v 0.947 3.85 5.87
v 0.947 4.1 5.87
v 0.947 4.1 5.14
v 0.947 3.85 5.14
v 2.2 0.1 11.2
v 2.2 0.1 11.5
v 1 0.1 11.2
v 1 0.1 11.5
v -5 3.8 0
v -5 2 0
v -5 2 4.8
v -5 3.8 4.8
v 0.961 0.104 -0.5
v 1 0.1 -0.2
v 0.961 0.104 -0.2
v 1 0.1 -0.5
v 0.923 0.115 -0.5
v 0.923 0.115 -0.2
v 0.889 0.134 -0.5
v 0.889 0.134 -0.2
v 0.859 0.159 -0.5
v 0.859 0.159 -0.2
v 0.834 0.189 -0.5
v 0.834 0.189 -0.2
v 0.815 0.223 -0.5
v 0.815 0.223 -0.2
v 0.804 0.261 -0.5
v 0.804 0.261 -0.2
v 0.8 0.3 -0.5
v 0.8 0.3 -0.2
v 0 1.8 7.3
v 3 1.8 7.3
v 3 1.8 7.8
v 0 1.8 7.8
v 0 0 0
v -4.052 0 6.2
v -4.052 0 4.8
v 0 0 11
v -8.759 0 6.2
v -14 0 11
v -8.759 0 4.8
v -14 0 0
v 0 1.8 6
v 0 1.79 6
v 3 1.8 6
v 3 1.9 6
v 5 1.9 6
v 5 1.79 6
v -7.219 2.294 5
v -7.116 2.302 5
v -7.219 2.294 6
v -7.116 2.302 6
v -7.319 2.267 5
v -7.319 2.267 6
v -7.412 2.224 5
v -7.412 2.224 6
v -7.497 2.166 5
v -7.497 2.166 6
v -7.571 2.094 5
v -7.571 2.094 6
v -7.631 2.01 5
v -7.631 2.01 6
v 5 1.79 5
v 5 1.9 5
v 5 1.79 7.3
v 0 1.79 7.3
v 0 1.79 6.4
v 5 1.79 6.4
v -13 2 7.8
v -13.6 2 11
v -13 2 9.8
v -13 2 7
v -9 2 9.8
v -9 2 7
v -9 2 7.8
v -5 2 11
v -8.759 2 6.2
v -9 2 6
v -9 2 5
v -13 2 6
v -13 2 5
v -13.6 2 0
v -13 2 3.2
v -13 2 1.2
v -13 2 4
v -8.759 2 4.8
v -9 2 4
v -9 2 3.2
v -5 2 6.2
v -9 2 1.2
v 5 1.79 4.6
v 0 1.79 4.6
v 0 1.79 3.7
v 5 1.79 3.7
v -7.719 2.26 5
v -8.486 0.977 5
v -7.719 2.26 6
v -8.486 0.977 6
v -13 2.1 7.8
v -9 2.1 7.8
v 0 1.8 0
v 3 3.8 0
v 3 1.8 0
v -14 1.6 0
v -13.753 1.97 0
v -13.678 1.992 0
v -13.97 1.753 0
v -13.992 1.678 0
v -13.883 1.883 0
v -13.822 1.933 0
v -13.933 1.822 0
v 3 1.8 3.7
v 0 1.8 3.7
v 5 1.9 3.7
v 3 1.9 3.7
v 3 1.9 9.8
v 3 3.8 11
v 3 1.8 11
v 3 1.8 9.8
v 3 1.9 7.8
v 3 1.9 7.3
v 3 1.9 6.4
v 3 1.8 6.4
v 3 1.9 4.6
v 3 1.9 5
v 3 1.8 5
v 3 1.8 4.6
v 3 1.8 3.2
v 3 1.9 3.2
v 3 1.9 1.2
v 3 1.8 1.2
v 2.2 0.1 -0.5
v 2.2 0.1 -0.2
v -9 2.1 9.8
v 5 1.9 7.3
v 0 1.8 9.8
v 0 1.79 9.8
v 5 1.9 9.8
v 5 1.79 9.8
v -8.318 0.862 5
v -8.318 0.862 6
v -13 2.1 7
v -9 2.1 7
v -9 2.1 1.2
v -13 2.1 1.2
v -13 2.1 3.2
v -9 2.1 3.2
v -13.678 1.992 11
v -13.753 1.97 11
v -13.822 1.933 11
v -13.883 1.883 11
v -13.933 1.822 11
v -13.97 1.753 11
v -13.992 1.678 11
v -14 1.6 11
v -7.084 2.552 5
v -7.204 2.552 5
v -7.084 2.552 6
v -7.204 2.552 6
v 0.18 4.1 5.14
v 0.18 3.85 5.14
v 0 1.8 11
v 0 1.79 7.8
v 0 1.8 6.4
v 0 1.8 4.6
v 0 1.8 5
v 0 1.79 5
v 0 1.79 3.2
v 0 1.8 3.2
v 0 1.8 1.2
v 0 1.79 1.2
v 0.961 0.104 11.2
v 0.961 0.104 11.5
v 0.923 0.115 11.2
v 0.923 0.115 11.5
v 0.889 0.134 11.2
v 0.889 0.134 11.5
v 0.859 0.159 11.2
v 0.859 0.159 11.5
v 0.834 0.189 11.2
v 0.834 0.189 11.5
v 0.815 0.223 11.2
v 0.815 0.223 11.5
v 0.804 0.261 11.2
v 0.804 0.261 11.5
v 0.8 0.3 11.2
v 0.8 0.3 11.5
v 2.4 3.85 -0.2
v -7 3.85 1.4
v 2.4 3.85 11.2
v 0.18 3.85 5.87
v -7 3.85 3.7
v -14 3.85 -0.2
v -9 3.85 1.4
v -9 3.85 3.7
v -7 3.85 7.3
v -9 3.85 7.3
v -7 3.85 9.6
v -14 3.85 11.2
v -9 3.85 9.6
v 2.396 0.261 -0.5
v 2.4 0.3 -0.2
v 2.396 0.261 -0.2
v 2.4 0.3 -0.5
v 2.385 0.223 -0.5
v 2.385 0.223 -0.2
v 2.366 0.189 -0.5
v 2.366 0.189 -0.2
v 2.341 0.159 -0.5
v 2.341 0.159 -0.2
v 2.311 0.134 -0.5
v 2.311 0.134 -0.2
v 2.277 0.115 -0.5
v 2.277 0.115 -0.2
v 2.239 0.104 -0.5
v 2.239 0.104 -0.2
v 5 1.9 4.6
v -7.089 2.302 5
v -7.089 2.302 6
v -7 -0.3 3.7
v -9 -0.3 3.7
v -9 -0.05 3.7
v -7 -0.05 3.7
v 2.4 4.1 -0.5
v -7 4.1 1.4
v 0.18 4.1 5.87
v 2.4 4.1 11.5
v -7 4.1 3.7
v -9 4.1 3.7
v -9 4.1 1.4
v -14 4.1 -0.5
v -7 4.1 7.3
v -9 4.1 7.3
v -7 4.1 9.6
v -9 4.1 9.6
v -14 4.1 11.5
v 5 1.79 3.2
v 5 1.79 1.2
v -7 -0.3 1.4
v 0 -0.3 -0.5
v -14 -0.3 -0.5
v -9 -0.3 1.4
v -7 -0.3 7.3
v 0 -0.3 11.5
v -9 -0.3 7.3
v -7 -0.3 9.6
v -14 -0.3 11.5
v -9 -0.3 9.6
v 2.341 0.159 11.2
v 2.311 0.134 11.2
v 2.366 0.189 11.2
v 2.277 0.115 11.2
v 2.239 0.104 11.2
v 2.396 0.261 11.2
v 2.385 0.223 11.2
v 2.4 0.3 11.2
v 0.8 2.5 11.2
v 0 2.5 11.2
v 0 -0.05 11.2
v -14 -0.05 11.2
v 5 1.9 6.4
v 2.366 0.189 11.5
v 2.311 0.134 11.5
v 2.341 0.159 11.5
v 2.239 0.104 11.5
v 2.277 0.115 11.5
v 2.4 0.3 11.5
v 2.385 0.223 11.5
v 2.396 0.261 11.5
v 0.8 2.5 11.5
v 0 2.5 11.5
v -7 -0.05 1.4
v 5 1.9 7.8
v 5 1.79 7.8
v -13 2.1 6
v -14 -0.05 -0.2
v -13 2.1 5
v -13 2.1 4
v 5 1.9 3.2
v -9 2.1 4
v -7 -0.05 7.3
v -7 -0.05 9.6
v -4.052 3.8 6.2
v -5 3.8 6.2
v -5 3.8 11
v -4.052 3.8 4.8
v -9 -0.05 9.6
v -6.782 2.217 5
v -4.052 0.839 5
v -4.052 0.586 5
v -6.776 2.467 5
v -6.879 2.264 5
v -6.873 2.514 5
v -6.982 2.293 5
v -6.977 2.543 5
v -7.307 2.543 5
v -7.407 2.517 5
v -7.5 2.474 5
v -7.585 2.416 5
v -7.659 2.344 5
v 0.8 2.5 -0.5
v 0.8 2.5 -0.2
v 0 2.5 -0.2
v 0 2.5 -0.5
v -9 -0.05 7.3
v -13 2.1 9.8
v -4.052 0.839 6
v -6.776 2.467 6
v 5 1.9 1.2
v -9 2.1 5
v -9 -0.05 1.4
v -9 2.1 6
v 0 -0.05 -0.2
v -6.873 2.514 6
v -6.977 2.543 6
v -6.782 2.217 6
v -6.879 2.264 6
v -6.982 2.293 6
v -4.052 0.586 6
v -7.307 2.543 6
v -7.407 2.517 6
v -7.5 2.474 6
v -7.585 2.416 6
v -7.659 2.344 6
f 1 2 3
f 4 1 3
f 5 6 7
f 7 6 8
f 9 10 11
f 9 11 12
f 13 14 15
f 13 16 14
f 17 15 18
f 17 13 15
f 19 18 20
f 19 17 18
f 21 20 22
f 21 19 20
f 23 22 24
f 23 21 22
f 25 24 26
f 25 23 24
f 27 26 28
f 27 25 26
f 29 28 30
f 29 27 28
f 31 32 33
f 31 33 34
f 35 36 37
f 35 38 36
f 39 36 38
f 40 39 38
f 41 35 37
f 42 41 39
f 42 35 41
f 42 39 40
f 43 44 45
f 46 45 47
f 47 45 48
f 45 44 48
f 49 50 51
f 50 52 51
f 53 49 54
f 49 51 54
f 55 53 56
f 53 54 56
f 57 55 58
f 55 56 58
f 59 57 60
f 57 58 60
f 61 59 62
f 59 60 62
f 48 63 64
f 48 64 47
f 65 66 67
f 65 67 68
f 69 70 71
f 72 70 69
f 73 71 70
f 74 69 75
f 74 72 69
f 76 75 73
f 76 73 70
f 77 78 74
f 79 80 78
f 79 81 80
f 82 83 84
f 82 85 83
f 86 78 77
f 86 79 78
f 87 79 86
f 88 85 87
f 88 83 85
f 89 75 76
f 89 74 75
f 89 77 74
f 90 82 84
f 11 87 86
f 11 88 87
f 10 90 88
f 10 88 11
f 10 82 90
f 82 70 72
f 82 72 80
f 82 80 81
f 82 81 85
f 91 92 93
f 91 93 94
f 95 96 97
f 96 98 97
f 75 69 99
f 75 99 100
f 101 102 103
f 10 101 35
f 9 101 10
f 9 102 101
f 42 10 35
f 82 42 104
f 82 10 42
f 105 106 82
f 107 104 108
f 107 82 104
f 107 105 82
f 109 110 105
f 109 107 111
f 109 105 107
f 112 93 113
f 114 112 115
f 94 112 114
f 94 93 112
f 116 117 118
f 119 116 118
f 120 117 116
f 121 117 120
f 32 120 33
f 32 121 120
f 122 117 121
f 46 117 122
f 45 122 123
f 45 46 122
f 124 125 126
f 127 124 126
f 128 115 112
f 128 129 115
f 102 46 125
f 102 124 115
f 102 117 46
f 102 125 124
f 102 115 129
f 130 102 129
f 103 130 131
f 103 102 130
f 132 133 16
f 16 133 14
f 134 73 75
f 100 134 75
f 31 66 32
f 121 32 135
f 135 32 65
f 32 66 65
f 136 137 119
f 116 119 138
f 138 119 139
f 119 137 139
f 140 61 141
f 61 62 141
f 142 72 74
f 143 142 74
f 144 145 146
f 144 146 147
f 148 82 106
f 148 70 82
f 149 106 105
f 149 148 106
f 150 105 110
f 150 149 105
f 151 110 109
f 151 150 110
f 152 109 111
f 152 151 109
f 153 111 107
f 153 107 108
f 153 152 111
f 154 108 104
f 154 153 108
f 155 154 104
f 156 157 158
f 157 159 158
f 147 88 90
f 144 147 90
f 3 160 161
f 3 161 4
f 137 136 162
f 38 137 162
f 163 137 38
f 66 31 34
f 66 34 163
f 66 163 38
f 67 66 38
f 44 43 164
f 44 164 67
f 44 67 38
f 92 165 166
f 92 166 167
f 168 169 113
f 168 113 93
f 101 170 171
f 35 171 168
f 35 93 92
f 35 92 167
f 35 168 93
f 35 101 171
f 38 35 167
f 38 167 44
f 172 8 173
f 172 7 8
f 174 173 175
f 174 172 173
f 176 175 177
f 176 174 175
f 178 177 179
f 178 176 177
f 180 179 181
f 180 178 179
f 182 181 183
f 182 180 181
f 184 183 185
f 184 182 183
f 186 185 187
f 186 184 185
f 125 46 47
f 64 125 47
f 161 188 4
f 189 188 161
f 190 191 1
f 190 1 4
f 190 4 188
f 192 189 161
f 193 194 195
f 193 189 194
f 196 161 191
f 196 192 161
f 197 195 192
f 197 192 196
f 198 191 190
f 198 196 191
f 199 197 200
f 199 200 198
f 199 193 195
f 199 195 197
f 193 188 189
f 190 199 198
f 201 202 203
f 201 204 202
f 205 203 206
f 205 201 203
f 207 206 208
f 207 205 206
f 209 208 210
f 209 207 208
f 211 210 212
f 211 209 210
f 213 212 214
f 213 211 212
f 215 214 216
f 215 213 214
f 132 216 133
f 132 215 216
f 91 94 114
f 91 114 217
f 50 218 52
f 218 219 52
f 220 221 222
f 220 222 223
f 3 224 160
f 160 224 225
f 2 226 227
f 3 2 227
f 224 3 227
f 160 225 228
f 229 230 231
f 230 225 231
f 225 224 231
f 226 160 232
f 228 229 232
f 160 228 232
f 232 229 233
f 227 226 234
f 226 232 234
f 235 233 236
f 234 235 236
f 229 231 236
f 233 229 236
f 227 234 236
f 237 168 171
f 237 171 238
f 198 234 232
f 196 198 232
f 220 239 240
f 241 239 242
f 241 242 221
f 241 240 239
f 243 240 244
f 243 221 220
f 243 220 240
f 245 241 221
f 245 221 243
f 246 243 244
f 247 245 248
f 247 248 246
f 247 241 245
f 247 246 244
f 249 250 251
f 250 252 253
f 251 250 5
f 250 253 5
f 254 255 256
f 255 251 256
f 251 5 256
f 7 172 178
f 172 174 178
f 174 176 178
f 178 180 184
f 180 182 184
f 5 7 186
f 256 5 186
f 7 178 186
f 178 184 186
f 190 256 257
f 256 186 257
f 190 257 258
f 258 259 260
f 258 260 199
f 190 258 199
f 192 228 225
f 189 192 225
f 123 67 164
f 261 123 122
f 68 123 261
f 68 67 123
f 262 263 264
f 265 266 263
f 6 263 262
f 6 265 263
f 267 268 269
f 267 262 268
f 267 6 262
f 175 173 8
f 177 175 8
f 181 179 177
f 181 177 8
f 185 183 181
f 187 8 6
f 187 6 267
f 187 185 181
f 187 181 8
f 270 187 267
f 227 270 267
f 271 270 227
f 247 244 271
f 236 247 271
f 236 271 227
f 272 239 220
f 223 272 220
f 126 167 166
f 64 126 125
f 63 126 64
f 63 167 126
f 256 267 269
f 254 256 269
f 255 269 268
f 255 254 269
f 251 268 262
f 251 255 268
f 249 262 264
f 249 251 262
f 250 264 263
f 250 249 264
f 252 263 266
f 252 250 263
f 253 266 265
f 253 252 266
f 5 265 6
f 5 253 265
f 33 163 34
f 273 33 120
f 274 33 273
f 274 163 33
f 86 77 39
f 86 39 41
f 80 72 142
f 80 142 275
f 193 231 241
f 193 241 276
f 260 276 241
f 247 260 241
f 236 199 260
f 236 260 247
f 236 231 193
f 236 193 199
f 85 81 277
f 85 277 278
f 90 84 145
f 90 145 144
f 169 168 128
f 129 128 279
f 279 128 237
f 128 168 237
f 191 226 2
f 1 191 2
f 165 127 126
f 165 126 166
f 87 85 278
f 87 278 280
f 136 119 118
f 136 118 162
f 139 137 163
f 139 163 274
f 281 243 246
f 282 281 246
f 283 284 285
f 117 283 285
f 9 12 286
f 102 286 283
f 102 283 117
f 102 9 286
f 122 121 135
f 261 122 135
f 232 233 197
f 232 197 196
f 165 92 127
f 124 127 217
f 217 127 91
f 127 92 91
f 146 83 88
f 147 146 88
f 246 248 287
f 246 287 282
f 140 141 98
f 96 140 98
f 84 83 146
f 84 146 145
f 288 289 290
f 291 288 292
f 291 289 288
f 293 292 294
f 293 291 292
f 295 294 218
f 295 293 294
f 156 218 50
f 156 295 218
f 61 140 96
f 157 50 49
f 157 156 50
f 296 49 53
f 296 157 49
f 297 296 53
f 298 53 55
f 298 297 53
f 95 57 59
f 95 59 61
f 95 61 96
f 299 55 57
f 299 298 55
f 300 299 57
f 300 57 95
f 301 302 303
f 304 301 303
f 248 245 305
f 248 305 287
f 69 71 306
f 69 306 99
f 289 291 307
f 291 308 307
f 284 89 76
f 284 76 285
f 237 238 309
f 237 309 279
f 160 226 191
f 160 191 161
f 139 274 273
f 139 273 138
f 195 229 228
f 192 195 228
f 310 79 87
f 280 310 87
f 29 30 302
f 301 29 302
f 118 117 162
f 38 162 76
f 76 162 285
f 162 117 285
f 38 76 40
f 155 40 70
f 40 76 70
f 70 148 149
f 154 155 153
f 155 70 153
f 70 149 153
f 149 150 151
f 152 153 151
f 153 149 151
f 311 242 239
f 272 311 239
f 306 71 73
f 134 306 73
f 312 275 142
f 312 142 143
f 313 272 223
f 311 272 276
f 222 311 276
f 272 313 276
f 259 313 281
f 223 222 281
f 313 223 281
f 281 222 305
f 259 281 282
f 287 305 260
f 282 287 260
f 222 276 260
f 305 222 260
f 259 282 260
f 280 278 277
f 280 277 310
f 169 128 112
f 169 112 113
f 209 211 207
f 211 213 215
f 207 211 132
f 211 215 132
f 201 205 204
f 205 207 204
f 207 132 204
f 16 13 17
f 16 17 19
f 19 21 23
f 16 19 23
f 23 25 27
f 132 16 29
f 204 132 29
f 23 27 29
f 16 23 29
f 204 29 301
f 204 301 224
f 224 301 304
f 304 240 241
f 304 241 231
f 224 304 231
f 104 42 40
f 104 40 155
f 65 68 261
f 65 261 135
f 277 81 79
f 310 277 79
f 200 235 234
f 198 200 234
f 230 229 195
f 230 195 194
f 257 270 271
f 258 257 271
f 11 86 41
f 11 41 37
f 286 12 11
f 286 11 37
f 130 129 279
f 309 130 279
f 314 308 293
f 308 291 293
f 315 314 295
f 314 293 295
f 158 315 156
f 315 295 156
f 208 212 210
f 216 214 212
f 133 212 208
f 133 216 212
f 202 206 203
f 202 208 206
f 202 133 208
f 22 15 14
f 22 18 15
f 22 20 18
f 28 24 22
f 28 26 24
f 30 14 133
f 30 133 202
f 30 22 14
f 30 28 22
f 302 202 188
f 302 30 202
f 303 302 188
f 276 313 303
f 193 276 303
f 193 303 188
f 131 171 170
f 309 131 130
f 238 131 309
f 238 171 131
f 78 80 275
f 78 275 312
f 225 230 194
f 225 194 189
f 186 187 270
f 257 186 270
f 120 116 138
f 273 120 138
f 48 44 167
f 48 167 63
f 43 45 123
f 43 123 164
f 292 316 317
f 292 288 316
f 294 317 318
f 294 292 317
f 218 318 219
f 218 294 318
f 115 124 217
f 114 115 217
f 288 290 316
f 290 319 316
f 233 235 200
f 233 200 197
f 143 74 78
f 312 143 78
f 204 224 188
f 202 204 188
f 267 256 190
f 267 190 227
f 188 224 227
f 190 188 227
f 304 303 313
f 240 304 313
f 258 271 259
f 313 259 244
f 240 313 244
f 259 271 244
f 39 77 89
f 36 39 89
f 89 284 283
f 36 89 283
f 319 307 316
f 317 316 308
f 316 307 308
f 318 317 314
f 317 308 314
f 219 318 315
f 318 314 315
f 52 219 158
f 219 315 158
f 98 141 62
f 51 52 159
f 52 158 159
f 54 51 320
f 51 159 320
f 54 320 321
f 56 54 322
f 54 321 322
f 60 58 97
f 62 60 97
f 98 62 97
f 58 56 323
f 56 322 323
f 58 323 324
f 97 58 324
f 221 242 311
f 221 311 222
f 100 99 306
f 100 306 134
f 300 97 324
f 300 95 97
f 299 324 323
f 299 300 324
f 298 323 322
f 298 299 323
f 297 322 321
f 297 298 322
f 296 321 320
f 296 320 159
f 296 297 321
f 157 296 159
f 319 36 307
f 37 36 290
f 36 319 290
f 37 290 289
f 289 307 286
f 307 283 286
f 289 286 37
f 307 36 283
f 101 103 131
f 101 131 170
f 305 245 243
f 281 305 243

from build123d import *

# Parameters (mm, degrees)
EXTRUDE_1_DEPTH          = 11
SKETCH_3_W               = 4
SKETCH_3_H               = 1
SKETCH_3_H_2             = 2
EXTRUDE_2_DEPTH          = 0.1
SKETCH_5_W               = 4.70699789
SKETCH_5_H               = 1.4
CUT_EXTRUDE_2_DEPTH      = 2.8
CUT_EXTRUDE_2_DEPTH_BACK = 3
EXTRUDE_3_DEPTH          = 0.5
FILLET_1_R               = 0.6
SKETCH_6_W               = 5
SKETCH_6_H               = 0.9
SKETCH_6_H_2             = 2
SKETCH_6_H_3             = 1
EXTRUDE_4_DEPTH          = 0.01
EXTRUDE_4_DEPTH_BACK     = 0.1
FILLET_2_R               = 0.4
SKETCH_8_W               = 12
SKETCH_8_H               = 4.4
SKETCH_8_W_2             = 11.4
SKETCH_8_H_2             = 3.9
EXTRUDE_5_DEPTH          = 16.4
SKETCH_9_W               = 2
SKETCH_9_H               = 2.3
SKETCH_9_W_2             = 0.767462698
SKETCH_9_H_2             = 0.729858924
CUT_EXTRUDE_5_DEPTH      = 0.25
SKETCH_12_W              = 2
SKETCH_12_H              = 2.3
CUT_EXTRUDE_6_DEPTH      = 0.25
CUT_EXTRUDE_7_DEPTH      = 1
CUT_EXTRUDE_7_DEPTH_BACK = 13
FILLET_4_R               = 0.2


with BuildPart() as part:
    # 草图2 → 凸台-拉伸1 (new body)
    with BuildSketch(Plane.XY):
        Polygon((0, 0), (-14, 0), (-14, 2), (-5, 2), (-5, 3.8), (3, 3.8), (3, 1.8), (0, 1.8), align=None)
    extrude(amount=EXTRUDE_1_DEPTH)

    # 草图3 → 凸台-拉伸2 (add)
    with BuildSketch(Plane(origin=(0, 2, 0), x_dir=(1, 0, 0), z_dir=(0, 1, 0))):
        with Locations((-11, -6.5)):
            Rectangle(SKETCH_3_W, SKETCH_3_H)
        with Locations((-11, -8.8)):
            Rectangle(SKETCH_3_W, SKETCH_3_H_2)
        with Locations((-11, -4.5)):
            Rectangle(SKETCH_3_W, SKETCH_3_H)
        with Locations((-11, -2.2)):
            Rectangle(SKETCH_3_W, SKETCH_3_H_2)
    extrude(amount=EXTRUDE_2_DEPTH)

    # 草图5 → 切除-拉伸2 (cut, two sides)
    with BuildSketch(Plane(origin=(0, 2, 0), x_dir=(1, 0, 0), z_dir=(0, 1, 0))) as cut_extrude_2_sk:
        with Locations((-6.40593933, -5.5)):
            Rectangle(SKETCH_5_W, SKETCH_5_H)
    extrude(amount=CUT_EXTRUDE_2_DEPTH, mode=Mode.SUBTRACT)
    extrude(cut_extrude_2_sk.sketch, amount=-CUT_EXTRUDE_2_DEPTH_BACK, mode=Mode.SUBTRACT)

    # 草图4 → 凸台-拉伸3 (add, symmetric)
    with BuildSketch(Plane.XY.offset(5.5)):
        Polygon((-8.486379068, 0.97747076), (-7.544801814, 2.552308695), (-6.918443353, 2.552308695), (-4.052440385, 0.838758912), (-4.052440385, 0.585620875), (-6.92380134, 2.302374137), (-7.456665732, 2.302374137), (-8.317726091, 0.862204981), align=None)
    extrude(amount=EXTRUDE_3_DEPTH, both=True)

    # 圆角1
    fillet_1_edges = [part.edges().sort_by_distance(p)[0] for p in [
        (-6.918443353, 2.552308695, 5.5),
        (-7.544801814, 2.552308695, 5.5),
        (-7.456665732, 2.302374137, 5.5),
        (-6.92380134, 2.302374137, 5.5),
    ]]
    fillet(fillet_1_edges, radius=FILLET_1_R)

    # 草图6 → 凸台-拉伸4 (add, two sides)
    with BuildSketch(Plane.XZ.offset(-1.8)) as extrude_4_sk:
        with Locations((2.5, 4.15)):
            Rectangle(SKETCH_6_W, SKETCH_6_H)
        with Locations((2.5, 8.8)):
            Rectangle(SKETCH_6_W, SKETCH_6_H_2)
        with Locations((2.5, 6.85)):
            Rectangle(SKETCH_6_W, SKETCH_6_H)
        with Locations((2.5, 2.2)):
            Rectangle(SKETCH_6_W, SKETCH_6_H_2)
        with Locations((2.5, 5.5)):
            Rectangle(SKETCH_6_W, SKETCH_6_H_3)
    extrude(amount=EXTRUDE_4_DEPTH)
    extrude(extrude_4_sk.sketch, amount=-EXTRUDE_4_DEPTH_BACK)

    # 圆角2
    fillet_2_edges = [part.edges().sort_by_distance(p)[0] for p in [
        (-14, 2, 5.5),
    ]]
    fillet(fillet_2_edges, radius=FILLET_2_R)


with BuildPart() as body_2:
    # 草图8 → 凸台-拉伸5 (new body)
    with BuildSketch(Plane.ZY.offset(14)):
        with Locations((5.5, 1.9)):
            Rectangle(SKETCH_8_W, SKETCH_8_H)
        with Locations((5.5, 1.9)):
            Rectangle(SKETCH_8_W_2, SKETCH_8_H_2, mode=Mode.SUBTRACT)
    extrude(amount=-EXTRUDE_5_DEPTH)

    # 草图9 → 切除-拉伸5 (cut)
    with BuildSketch(Plane(origin=(0, 4.1, 0), x_dir=(1, 0, 0), z_dir=(0, 1, 0))):
        with Locations((-8, -2.55)):
            Rectangle(SKETCH_9_W, SKETCH_9_H)
        with Locations((-8, -8.45)):
            Rectangle(SKETCH_9_W, SKETCH_9_H)
        with Locations((0.563339888, -5.505397464)):
            Rectangle(SKETCH_9_W_2, SKETCH_9_H_2)
    extrude(amount=-CUT_EXTRUDE_5_DEPTH, mode=Mode.SUBTRACT)

    # 草图12 → 切除-拉伸6 (cut)
    with BuildSketch(Plane.XZ.offset(0.3)):
        with Locations((-8, 8.45)):
            Rectangle(SKETCH_12_W, SKETCH_12_H)
        with Locations((-8, 2.55)):
            Rectangle(SKETCH_12_W, SKETCH_12_H)
    extrude(amount=-CUT_EXTRUDE_6_DEPTH, mode=Mode.SUBTRACT)

    # 草图13 → 切除-拉伸7 (cut, two sides)
    with BuildSketch(Plane.XY.offset(11.5)) as cut_extrude_7_sk:
        Polygon((2.4, 0.1), (0.8, 0.1), (0.8, 2.5), (0, 2.5), (0, -0.781778745), (2.4, -0.781778745), align=None)
    extrude(amount=CUT_EXTRUDE_7_DEPTH, mode=Mode.SUBTRACT)
    extrude(cut_extrude_7_sk.sketch, amount=-CUT_EXTRUDE_7_DEPTH_BACK, mode=Mode.SUBTRACT)

    # 圆角4
    fillet_4_edges = [body_2.edges().sort_by_distance(p)[0] for p in [
        (0.8, 0.1, -0.35),
        (0.8, 0.1, 11.35),
        (2.4, 0.1, -0.35),
        (2.4, 0.1, 11.35),
    ]]
    fillet(fillet_4_edges, radius=FILLET_4_R)


solid = Compound([part.part, body_2.part])
